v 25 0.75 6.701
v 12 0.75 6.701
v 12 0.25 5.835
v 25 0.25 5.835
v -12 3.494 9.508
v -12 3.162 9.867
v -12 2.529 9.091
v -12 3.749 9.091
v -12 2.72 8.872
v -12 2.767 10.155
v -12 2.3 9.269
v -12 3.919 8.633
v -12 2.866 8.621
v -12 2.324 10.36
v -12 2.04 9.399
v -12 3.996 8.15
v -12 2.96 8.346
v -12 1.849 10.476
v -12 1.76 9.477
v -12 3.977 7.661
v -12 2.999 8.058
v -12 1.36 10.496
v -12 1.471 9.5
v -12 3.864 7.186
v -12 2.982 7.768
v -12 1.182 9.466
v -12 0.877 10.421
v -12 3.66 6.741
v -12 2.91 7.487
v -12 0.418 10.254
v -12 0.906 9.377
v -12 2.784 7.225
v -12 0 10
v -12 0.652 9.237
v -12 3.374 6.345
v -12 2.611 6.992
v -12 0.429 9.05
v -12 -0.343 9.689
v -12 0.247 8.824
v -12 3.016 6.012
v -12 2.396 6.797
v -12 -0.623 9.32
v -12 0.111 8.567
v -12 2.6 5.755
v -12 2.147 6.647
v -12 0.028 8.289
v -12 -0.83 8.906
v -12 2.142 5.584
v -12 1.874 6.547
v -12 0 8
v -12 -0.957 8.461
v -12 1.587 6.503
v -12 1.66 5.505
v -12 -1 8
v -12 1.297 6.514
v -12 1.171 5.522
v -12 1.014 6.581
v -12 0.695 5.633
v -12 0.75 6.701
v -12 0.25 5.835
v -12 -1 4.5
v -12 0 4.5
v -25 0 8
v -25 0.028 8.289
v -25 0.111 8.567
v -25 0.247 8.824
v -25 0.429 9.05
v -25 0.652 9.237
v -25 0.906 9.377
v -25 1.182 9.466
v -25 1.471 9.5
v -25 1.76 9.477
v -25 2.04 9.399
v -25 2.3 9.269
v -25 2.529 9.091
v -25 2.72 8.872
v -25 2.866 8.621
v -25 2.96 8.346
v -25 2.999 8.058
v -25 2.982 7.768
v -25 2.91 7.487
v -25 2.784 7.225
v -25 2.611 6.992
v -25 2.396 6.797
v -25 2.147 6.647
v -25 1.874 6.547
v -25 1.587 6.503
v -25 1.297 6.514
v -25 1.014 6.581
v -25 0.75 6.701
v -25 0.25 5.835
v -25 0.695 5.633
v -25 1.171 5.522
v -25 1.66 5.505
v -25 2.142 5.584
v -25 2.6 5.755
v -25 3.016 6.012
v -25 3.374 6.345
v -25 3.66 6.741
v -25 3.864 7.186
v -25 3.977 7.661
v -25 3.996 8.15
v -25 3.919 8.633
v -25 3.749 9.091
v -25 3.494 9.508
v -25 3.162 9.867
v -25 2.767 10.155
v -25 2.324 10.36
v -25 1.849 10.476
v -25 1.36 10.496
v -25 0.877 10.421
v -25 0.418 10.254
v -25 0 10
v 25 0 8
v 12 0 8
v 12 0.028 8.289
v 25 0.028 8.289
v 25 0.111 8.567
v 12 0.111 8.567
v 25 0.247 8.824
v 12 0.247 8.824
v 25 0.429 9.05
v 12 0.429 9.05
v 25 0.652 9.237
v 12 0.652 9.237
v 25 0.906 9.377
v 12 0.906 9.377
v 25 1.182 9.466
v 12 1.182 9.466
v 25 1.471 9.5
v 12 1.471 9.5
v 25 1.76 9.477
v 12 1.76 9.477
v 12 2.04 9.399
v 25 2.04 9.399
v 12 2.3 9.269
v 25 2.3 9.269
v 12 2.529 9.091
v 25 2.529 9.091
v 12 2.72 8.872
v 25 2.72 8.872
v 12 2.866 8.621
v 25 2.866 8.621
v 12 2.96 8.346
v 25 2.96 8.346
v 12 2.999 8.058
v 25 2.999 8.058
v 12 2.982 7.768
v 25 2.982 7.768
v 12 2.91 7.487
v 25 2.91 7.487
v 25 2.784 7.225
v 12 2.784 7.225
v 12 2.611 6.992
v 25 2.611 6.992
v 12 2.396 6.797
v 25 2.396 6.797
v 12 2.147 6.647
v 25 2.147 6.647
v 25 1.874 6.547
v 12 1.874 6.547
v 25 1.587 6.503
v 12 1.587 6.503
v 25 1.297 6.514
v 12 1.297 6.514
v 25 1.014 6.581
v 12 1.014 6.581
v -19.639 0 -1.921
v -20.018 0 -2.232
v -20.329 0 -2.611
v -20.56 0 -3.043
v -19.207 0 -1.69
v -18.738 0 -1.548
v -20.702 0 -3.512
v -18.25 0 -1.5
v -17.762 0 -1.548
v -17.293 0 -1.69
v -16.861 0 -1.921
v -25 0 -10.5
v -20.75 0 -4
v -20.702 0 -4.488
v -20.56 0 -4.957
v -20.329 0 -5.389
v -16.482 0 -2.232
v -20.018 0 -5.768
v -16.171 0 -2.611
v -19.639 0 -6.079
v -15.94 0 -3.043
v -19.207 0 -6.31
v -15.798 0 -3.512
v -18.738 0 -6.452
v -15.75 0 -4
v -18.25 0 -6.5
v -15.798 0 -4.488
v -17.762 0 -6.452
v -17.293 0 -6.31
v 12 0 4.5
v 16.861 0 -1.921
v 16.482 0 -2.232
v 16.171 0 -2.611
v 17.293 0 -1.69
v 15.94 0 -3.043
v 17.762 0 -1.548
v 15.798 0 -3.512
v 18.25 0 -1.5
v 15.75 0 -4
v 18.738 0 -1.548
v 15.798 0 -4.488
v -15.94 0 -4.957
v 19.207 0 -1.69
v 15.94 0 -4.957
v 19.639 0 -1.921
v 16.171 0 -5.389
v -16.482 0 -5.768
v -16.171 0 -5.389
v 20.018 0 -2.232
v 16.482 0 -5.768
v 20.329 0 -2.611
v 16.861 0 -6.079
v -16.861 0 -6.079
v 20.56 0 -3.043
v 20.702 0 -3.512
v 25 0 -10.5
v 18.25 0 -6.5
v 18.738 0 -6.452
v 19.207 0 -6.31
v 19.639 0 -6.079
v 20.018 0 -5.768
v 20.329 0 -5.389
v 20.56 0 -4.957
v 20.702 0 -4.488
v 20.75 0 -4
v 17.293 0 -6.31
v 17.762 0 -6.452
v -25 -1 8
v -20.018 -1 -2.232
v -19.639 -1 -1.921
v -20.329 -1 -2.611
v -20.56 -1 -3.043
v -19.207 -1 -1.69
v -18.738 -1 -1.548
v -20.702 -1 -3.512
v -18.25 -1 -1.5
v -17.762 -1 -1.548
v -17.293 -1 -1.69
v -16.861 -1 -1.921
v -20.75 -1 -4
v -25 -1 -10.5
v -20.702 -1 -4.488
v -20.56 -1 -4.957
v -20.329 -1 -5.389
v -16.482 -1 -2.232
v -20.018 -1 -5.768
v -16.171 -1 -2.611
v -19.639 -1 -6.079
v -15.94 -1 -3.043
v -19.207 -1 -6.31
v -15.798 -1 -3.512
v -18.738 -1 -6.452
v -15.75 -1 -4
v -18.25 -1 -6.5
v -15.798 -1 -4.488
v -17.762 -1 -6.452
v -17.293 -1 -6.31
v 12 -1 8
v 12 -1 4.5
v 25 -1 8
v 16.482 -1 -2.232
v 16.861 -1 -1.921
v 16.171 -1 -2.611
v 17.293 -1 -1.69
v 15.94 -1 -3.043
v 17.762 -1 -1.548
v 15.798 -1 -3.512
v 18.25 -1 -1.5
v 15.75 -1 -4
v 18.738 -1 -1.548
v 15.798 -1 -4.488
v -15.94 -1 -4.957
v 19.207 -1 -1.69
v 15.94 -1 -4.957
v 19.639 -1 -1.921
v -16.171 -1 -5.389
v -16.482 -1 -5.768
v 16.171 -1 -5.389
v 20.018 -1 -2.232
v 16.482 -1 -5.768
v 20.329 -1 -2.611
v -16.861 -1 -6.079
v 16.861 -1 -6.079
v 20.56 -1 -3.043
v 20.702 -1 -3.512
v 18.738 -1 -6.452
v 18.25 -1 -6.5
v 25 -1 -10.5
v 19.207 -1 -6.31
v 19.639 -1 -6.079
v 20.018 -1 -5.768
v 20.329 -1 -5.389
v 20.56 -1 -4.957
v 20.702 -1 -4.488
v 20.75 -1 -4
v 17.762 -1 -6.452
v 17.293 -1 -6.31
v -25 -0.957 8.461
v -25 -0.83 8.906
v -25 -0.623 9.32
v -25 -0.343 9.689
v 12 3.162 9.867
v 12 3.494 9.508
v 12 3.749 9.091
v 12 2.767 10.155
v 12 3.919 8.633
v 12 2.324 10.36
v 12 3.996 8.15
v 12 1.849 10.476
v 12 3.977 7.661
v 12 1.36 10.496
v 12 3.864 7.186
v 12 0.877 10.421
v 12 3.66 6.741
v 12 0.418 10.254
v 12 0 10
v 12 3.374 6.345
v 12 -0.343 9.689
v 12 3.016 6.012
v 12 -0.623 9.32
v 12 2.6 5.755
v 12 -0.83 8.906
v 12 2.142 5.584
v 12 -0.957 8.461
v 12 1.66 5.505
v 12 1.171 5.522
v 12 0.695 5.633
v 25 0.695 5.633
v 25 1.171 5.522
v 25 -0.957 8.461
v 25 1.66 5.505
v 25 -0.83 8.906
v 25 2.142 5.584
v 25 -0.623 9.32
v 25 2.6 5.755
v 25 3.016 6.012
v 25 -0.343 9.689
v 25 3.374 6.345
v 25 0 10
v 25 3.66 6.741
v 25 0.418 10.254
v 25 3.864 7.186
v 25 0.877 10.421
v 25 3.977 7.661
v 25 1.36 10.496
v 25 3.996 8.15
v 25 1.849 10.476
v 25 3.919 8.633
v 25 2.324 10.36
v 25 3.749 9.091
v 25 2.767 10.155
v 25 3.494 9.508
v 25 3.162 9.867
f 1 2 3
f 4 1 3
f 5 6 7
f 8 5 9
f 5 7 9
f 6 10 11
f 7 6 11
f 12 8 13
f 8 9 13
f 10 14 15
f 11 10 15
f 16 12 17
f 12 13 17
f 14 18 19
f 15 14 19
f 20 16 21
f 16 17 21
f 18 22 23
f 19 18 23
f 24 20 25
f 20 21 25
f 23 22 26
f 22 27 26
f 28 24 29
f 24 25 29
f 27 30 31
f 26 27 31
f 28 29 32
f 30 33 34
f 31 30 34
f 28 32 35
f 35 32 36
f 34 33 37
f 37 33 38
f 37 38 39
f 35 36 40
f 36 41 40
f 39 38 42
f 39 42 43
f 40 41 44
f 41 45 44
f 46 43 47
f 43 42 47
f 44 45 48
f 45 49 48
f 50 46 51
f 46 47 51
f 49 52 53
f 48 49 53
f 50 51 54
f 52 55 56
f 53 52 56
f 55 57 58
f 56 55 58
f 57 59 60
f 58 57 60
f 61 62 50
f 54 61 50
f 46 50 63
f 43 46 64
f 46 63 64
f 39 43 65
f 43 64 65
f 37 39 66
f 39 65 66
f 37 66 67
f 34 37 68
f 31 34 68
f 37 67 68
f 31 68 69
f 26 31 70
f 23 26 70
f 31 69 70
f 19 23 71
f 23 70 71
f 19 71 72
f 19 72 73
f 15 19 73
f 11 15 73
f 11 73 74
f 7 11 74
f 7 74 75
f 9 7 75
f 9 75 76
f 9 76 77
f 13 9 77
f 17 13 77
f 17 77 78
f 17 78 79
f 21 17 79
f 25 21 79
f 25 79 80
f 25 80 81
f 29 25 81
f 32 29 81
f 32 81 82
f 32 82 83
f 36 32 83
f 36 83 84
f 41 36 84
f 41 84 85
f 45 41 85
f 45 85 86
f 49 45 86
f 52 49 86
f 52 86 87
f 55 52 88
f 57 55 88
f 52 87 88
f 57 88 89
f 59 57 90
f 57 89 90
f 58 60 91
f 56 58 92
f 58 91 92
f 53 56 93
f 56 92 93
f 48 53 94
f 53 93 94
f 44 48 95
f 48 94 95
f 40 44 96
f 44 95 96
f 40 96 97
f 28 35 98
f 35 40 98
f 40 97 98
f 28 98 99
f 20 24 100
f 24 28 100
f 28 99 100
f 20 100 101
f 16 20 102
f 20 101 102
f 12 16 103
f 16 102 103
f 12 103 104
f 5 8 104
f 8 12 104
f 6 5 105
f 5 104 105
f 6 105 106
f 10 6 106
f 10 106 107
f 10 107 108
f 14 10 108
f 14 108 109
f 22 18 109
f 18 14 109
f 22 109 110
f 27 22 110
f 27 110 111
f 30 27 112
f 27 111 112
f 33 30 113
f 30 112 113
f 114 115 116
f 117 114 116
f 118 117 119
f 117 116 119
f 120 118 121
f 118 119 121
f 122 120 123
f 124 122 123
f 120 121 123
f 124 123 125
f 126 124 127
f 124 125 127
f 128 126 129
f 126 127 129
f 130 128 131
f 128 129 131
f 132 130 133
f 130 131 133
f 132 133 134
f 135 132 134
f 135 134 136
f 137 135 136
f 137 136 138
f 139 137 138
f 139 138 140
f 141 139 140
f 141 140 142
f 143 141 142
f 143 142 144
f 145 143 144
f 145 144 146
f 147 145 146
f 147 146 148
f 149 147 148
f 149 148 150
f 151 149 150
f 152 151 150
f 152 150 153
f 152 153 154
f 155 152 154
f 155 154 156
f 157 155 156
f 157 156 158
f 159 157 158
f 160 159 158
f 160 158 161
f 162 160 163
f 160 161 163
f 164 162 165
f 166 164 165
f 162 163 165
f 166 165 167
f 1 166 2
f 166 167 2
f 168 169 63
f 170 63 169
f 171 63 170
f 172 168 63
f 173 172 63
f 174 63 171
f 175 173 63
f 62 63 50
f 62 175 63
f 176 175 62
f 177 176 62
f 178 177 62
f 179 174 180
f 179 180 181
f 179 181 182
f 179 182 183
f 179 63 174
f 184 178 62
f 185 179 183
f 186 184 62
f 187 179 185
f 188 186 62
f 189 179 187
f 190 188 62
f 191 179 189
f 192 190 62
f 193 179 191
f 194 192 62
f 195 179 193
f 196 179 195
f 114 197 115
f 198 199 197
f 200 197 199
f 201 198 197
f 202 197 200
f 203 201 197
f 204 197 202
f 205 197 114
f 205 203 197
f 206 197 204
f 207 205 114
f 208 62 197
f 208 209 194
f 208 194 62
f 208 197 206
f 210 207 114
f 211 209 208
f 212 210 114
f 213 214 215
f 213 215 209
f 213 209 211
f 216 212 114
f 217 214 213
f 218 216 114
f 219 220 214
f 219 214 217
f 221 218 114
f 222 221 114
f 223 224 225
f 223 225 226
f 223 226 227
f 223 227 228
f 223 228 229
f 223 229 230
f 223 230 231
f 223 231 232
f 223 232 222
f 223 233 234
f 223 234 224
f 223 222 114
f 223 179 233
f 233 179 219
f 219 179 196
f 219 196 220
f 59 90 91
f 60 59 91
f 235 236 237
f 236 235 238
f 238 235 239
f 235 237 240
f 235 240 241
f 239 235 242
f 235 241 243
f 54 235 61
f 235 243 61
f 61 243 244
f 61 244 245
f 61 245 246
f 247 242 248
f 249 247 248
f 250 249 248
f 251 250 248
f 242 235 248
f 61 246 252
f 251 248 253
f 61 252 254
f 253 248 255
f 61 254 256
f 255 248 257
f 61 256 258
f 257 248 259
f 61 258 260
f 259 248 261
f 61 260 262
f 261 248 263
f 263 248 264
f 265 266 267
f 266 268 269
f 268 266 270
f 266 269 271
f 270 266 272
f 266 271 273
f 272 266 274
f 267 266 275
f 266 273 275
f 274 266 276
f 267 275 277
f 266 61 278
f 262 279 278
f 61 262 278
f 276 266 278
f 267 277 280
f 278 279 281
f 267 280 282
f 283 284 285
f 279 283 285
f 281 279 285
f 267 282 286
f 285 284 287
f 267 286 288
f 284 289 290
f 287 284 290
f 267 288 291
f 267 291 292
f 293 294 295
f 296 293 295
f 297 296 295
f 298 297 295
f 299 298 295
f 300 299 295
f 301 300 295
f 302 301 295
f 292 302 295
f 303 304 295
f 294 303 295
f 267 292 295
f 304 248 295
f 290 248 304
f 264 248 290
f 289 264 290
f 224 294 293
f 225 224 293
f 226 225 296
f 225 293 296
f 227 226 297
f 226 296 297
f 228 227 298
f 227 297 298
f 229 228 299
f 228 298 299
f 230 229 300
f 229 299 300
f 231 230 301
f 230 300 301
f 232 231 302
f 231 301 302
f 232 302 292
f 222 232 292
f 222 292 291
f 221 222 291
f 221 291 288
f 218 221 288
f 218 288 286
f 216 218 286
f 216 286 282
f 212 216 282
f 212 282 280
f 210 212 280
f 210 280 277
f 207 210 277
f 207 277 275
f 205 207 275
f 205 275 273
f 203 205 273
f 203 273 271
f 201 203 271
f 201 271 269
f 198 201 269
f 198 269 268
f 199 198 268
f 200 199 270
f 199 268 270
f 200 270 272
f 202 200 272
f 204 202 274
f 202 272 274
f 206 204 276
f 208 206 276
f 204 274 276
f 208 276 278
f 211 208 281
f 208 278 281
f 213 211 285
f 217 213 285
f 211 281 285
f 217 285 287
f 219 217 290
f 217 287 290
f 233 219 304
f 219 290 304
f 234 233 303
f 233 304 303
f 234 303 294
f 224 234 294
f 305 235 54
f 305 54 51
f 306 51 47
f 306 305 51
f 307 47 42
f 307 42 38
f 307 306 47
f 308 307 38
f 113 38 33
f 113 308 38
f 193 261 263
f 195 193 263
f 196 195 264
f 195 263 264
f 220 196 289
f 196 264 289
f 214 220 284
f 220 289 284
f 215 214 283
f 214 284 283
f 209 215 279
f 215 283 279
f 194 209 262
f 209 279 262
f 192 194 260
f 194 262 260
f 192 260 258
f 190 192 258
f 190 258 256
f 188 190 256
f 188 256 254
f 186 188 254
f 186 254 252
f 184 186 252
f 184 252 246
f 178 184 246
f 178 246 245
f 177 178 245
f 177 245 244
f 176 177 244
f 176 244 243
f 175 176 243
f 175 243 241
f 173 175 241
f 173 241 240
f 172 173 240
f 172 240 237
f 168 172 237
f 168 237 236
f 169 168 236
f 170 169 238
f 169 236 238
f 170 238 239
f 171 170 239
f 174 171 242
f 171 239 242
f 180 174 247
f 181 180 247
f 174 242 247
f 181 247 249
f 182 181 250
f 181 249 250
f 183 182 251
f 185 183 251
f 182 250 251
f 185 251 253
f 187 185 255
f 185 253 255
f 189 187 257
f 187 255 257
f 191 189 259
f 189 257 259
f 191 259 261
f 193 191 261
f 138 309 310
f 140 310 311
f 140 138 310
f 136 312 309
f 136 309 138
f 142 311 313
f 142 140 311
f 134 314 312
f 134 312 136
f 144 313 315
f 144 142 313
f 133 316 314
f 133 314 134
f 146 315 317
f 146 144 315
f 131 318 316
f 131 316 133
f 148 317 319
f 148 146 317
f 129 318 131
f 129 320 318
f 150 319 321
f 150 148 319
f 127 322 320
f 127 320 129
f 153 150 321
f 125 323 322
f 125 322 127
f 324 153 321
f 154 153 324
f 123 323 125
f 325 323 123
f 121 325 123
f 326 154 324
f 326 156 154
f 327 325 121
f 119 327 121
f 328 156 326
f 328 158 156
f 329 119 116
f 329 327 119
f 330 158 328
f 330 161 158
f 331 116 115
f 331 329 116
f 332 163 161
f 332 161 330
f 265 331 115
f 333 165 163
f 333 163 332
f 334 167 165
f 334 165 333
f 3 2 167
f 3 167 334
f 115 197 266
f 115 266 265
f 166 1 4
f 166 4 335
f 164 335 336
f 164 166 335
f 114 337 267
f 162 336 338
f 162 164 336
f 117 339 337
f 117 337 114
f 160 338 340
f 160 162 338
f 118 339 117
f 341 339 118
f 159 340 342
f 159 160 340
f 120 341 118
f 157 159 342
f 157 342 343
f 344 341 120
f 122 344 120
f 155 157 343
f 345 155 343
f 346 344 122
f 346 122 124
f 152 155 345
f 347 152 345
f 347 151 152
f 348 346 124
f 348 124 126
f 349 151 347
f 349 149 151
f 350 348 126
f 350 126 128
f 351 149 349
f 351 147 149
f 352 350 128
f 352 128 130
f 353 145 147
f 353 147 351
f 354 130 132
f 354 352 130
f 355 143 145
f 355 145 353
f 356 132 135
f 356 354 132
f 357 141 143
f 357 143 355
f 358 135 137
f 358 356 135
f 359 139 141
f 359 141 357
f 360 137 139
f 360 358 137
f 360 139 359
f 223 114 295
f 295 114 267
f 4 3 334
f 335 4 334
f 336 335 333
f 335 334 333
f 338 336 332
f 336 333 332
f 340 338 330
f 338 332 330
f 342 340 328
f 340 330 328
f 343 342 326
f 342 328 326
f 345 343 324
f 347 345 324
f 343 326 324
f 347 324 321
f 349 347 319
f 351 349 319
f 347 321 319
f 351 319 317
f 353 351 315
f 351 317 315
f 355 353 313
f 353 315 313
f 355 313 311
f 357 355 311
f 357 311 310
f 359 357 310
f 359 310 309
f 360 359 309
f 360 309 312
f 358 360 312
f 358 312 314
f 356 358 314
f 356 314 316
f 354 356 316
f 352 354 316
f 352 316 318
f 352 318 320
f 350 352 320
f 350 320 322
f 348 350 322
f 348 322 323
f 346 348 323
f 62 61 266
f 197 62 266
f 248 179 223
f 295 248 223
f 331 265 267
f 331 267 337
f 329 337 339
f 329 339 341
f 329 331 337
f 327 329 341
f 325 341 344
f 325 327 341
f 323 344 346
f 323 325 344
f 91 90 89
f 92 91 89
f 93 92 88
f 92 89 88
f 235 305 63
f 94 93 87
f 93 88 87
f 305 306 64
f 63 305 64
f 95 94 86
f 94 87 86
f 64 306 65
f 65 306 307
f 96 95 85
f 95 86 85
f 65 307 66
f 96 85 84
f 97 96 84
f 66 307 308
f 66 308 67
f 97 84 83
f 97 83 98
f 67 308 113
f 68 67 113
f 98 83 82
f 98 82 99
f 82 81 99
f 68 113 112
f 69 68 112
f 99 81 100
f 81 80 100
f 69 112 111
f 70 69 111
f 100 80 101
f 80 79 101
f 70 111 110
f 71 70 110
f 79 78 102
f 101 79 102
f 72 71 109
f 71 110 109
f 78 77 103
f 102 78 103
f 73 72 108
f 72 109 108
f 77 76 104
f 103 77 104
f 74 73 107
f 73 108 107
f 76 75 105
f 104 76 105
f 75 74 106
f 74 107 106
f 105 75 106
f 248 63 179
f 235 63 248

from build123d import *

# Parameters (mm, degrees)
SKETCH2_W               = 50
SKETCH2_H               = 21
BASE_FLANGE1_DEPTH      = 1
HEM1_START              = -25
HEM1_DEPTH              = 50
HEM1_2_DEPTH            = 50
CUT_EXTRUDE1_DEPTH      = 28.408940147
CUT_EXTRUDE1_DEPTH_BACK = 28.408940147
SKETCH5_W               = 24
SKETCH5_H               = 6
SKETCH6_R               = 2.5
CUT_EXTRUDE2_DEPTH      = 28.572631358


# Read off the part's stored shape, not the designer's step: Hem1
# Sheet-metal steps are written as plain solids
with BuildPart() as part:
    # Sketch2 → Base-Flange1 (new body)
    with BuildSketch(Plane(origin=(0, 0, 0), x_dir=(1, 0, 0), z_dir=(0, 1, 0))):
        Rectangle(SKETCH2_W, SKETCH2_H)
    extrude(amount=-BASE_FLANGE1_DEPTH)

    # Hem1 outline → Hem1 (cut)
    with BuildSketch(Plane.YZ.offset(HEM1_START)):
        with BuildLine():
            ThreePointArc((-1, 8), (-0.736067978, 9.118033989), (0, 10))
            Line((0, 10), (0, 10.5))
            Line((0, 10.5), (-1, 10.5))
            Line((-1, 10.5), (-1, 8))
        make_face()
    extrude(amount=HEM1_DEPTH, mode=Mode.SUBTRACT)

    # Hem1 2 outline → Hem1 2 (add)
    with BuildSketch(Plane.YZ.offset(HEM1_START)):
        with BuildLine():
            Line((0.75, 6.700961894), (0.25, 5.834936491))
            ThreePointArc((0.25, 5.834936491), (3.995508667, 8.149788152), (0, 10))
            Line((0, 10), (0, 8))
            ThreePointArc((0, 8), (2.799038106, 8.75), (0.75, 6.700961894))
        make_face()
    extrude(amount=HEM1_2_DEPTH)

    # Sketch5 → Cut-Extrude1 (cut, two sides: drawn at the far end of the back side and taken through both)
    with BuildSketch(Plane(origin=(0, 0, 0), x_dir=(1, 0, 0), z_dir=(0, 1, 0)).offset(-CUT_EXTRUDE1_DEPTH_BACK)):
        with Locations((0, -7.5)):
            Rectangle(SKETCH5_W, SKETCH5_H)
    extrude(amount=CUT_EXTRUDE1_DEPTH + CUT_EXTRUDE1_DEPTH_BACK, mode=Mode.SUBTRACT)

    # Sketch6 → Cut-Extrude2 (cut, through all)
    with BuildSketch(Plane.XZ.offset(1)):
        with Locations(Location((18.25, -4, 0), (0, 0, 270))):
            Circle(SKETCH6_R)
        with Locations(Location((-18.25, -4, 0), (0, 0, 270))):
            Circle(SKETCH6_R)
    extrude(amount=-CUT_EXTRUDE2_DEPTH, mode=Mode.SUBTRACT)


solid = part.part
